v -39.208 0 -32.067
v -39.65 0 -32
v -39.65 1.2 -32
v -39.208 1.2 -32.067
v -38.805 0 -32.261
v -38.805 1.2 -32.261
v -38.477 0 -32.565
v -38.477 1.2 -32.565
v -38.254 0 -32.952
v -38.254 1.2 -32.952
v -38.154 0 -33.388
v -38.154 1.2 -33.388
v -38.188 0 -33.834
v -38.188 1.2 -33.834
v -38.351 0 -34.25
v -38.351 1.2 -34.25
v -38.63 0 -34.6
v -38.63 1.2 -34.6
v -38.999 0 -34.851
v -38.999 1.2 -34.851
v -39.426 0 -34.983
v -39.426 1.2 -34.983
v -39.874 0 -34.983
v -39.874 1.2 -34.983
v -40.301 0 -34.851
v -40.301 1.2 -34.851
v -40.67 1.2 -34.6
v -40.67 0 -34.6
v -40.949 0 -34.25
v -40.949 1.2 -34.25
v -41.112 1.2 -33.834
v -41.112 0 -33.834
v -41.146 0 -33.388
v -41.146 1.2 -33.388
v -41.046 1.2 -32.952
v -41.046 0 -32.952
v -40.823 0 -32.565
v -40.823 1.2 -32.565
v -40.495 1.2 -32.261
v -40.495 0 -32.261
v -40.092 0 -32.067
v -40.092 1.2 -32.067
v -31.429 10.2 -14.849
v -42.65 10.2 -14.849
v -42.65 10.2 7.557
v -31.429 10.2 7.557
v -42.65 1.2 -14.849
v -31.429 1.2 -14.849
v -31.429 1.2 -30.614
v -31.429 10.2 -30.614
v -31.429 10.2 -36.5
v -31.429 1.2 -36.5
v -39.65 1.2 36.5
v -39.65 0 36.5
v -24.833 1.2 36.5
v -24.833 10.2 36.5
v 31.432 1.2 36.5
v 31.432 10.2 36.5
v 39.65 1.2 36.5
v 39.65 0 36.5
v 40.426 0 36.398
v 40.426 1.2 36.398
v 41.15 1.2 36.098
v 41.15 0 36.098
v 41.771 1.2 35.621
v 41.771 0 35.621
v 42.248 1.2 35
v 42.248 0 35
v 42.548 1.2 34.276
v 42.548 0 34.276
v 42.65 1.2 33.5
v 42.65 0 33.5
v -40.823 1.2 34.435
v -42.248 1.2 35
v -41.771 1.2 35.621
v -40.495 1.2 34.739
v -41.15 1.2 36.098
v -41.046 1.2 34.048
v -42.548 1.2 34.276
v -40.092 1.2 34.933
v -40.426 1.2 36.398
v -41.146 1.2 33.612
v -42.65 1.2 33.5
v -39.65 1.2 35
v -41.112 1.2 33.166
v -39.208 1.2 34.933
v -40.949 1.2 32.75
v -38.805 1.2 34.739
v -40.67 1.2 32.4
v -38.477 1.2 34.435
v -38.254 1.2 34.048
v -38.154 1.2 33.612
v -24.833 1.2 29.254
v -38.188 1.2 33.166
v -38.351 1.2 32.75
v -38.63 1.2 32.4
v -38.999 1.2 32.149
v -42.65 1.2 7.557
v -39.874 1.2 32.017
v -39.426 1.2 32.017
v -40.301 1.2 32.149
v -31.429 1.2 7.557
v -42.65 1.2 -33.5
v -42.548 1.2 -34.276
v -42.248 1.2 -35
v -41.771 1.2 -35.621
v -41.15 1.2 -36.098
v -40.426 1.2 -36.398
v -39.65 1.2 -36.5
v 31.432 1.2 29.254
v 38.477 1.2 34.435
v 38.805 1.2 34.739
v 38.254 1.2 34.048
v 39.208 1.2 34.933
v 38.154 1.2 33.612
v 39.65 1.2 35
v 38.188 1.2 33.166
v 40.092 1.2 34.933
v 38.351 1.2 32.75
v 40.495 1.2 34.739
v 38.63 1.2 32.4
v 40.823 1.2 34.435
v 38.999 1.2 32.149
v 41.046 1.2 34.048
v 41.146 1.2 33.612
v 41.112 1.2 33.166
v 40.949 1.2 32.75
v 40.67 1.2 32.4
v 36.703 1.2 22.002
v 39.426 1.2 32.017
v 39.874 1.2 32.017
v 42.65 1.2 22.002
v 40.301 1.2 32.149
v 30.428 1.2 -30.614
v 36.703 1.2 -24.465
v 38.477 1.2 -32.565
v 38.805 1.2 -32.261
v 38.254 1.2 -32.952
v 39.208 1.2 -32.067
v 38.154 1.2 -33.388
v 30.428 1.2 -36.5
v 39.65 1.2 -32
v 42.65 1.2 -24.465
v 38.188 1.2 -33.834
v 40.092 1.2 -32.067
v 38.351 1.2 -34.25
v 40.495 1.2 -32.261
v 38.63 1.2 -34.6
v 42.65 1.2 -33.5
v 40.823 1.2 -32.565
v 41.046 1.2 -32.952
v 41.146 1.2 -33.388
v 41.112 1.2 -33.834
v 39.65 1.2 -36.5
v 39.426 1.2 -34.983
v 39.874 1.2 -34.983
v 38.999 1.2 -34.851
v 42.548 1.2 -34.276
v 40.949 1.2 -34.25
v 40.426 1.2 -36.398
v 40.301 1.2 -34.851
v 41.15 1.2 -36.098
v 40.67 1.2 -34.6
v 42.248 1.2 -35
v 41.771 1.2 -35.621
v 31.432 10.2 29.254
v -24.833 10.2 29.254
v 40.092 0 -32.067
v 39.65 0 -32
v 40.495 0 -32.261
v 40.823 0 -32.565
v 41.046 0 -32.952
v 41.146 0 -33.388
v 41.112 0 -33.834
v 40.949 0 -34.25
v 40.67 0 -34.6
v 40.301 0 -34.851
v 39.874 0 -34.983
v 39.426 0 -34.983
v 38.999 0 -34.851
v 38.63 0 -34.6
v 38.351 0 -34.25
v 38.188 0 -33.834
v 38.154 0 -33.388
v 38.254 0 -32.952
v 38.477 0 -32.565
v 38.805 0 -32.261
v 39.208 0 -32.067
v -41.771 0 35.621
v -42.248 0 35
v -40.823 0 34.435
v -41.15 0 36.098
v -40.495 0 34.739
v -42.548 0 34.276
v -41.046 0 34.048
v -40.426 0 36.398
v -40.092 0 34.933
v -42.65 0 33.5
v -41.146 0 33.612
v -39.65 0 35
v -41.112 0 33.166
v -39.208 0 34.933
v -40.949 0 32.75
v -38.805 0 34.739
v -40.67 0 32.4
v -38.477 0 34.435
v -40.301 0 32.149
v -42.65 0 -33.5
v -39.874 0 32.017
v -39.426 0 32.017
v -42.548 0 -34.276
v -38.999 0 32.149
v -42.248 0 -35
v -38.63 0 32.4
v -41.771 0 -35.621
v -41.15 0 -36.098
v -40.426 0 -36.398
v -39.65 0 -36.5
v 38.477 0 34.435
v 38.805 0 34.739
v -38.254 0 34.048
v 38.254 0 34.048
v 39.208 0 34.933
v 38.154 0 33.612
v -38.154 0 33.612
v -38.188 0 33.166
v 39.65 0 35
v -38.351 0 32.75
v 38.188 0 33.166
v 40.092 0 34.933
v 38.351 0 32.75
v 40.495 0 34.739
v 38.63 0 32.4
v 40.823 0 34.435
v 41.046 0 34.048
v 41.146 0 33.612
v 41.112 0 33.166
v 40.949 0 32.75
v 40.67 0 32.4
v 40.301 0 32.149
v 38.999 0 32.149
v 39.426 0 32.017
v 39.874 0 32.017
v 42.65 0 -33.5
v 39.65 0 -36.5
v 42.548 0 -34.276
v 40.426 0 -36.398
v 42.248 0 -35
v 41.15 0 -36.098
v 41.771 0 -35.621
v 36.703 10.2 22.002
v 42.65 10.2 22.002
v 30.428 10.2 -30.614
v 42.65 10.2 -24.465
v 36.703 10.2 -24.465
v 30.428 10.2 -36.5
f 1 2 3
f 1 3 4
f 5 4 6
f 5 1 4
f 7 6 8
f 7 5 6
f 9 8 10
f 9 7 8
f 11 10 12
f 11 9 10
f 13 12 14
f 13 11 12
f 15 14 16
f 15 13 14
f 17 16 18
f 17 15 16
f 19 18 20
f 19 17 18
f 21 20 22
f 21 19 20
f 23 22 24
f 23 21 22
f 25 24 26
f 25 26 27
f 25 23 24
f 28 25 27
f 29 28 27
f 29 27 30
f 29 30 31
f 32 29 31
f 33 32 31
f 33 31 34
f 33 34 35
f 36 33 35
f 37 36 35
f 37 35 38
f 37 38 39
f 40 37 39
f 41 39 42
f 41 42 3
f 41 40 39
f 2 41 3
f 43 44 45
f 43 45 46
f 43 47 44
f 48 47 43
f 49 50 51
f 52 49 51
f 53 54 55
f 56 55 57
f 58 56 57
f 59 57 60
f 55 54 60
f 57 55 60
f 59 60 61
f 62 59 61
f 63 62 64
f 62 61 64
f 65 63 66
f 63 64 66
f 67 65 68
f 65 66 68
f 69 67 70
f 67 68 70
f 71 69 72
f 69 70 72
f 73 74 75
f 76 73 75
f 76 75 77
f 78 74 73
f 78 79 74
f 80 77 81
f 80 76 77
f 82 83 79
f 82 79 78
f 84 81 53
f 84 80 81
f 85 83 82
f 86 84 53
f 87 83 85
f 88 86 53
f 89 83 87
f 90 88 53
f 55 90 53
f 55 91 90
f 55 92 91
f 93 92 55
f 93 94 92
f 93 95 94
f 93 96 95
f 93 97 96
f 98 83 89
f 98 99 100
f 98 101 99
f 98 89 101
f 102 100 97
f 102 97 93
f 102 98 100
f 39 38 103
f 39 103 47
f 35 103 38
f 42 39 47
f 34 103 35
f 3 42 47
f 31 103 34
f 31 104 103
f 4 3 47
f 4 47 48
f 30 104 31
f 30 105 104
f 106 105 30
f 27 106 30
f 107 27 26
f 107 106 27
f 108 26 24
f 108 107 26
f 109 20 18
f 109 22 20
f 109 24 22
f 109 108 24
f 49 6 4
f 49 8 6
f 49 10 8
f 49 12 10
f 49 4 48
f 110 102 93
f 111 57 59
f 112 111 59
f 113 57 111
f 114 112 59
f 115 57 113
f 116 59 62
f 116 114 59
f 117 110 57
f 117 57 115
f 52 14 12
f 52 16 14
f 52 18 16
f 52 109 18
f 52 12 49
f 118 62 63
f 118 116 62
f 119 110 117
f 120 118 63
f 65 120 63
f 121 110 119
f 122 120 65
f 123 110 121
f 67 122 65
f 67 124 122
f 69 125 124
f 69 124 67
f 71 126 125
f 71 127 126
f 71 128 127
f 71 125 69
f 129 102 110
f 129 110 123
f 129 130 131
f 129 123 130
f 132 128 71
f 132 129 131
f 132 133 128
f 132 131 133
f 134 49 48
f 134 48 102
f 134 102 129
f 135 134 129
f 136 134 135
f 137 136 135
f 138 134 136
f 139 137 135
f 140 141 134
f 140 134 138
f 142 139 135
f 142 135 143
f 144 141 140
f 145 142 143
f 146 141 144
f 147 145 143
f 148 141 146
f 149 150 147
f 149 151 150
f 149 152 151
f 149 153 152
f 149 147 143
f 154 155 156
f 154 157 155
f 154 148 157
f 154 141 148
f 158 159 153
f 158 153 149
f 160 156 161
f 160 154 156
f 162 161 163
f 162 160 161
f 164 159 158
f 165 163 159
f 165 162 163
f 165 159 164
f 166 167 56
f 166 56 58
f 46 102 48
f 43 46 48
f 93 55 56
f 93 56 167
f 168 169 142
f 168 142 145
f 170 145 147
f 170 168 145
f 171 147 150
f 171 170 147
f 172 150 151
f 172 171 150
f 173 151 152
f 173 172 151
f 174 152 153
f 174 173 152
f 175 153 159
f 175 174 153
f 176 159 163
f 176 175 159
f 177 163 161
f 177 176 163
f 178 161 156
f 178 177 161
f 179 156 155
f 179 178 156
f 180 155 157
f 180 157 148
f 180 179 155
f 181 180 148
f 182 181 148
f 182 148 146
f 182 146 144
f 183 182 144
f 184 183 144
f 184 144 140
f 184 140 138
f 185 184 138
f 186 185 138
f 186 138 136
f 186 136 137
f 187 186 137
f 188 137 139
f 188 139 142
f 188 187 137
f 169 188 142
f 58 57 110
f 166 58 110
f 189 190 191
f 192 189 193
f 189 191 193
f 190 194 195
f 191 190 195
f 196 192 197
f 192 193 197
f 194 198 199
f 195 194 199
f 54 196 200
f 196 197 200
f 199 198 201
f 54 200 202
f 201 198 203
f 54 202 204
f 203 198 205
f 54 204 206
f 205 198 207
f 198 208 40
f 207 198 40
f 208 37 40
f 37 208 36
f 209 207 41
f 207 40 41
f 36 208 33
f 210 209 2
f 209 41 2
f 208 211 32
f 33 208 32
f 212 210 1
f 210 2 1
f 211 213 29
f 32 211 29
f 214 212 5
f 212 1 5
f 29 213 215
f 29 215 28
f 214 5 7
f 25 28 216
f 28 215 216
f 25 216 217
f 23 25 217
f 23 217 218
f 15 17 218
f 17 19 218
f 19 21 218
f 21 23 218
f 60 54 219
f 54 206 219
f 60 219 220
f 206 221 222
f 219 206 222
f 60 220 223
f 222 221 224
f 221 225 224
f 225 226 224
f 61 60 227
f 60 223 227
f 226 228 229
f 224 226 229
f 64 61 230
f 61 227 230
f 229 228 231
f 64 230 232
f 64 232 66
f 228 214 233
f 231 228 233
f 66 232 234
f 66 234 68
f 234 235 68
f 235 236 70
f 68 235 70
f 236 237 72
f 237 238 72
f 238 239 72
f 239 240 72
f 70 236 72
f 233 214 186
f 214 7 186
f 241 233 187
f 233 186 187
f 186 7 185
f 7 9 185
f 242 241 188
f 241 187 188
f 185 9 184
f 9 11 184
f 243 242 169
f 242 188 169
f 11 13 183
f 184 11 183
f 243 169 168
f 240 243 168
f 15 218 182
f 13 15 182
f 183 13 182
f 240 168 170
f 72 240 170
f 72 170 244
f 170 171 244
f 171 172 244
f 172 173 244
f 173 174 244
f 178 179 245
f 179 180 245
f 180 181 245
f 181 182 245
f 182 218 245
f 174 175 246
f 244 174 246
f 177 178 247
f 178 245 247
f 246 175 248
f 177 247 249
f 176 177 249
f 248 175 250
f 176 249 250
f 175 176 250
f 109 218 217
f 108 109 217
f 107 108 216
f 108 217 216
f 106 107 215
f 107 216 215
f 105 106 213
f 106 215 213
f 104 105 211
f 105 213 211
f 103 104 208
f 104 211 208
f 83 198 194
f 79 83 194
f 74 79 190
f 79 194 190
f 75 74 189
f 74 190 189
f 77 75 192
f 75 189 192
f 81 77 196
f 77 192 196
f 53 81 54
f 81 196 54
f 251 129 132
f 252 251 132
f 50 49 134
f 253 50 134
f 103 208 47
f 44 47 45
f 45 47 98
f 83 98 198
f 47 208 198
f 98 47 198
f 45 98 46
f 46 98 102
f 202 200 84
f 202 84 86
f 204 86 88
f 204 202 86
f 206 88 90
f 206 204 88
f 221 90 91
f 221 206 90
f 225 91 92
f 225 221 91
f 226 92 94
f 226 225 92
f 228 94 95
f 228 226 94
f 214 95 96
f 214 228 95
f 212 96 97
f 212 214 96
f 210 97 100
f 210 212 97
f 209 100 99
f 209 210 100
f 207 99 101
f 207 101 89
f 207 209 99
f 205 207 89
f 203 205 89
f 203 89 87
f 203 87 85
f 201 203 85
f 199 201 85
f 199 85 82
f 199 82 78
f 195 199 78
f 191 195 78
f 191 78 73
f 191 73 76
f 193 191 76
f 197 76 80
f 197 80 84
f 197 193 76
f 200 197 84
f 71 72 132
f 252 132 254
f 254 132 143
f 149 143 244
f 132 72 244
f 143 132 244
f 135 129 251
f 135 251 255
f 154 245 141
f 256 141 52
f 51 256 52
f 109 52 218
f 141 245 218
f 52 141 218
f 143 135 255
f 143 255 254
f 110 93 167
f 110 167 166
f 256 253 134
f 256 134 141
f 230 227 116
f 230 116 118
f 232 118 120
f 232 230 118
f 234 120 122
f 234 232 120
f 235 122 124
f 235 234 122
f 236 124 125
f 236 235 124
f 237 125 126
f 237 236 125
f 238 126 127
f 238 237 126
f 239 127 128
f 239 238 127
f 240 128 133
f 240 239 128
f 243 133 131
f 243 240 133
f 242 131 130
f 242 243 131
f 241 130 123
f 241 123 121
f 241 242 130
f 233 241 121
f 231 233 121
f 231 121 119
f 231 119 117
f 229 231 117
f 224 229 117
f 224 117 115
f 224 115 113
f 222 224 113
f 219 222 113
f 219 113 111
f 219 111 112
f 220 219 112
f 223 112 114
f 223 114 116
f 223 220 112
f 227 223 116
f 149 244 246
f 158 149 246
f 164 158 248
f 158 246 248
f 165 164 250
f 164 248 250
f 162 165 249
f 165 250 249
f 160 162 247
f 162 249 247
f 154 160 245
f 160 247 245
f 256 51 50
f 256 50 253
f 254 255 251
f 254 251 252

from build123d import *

# Parameters (mm, degrees)
SKETCH_1_R      = 1.5
EXTRUDE_1_DEPTH = 1.2
SKETCH_2_W      = 56.26507056
SKETCH_2_H      = 7.246466171
SKETCH_2_W_2    = 5.94694539
SKETCH_2_H_2    = 46.466862472
SKETCH_2_W_3    = 61.857792897
SKETCH_2_H_3    = 5.88577246
SKETCH_2_W_4    = 11.220508583
SKETCH_2_H_4    = 22.405589271
EXTRUDE_2_DEPTH = 9


with BuildPart() as part:
    # 草图1 → 凸台-拉伸1 (new body)
    with BuildSketch(Plane(origin=(0, 0, 0), x_dir=(1, 0, 0), z_dir=(0, 1, 0))):
        with BuildLine():
            Line((39.65, 36.5), (-39.65, 36.5))
            ThreePointArc((-39.65, 36.5), (-41.771320344, 35.621320344), (-42.65, 33.5))
            Line((-42.65, 33.5), (-42.65, -33.5))
            ThreePointArc((-42.65, -33.5), (-41.771320344, -35.621320344), (-39.65, -36.5))
            Line((-39.65, -36.5), (39.65, -36.5))
            ThreePointArc((39.65, -36.5), (41.771320344, -35.621320344), (42.65, -33.5))
            Line((42.65, -33.5), (42.65, 33.5))
            ThreePointArc((42.65, 33.5), (41.771320344, 35.621320344), (39.65, 36.5))
        make_face()
        with Locations(Location((39.65, -33.5, 0), (0, 0, 270))):
            Circle(SKETCH_1_R, mode=Mode.SUBTRACT)
        with Locations(Location((-39.65, -33.5, 0), (0, 0, 270))):
            Circle(SKETCH_1_R, mode=Mode.SUBTRACT)
        with Locations(Location((-39.65, 33.5, 0), (0, 0, 270))):
            Circle(SKETCH_1_R, mode=Mode.SUBTRACT)
        with Locations(Location((39.65, 33.5, 0), (0, 0, 270))):
            Circle(SKETCH_1_R, mode=Mode.SUBTRACT)
    extrude(amount=EXTRUDE_1_DEPTH)

    # 草图2 → 凸台-拉伸2 (add)
    with BuildSketch(Plane(origin=(0, 1.2, 0), x_dir=(1, 0, 0), z_dir=(0, 1, 0))):
        with Locations((3.299265125, -32.876766915)):
            Rectangle(SKETCH_2_W, SKETCH_2_H)
        with Locations((39.676527305, 1.231104757)):
            Rectangle(SKETCH_2_W_2, SKETCH_2_H_2)
        with Locations((-0.500594968, 33.55711377)):
            Rectangle(SKETCH_2_W_3, SKETCH_2_H_3)
        with Locations((-37.039745709, 3.646177151)):
            Rectangle(SKETCH_2_W_4, SKETCH_2_H_4)
    extrude(amount=EXTRUDE_2_DEPTH)


solid = part.part
